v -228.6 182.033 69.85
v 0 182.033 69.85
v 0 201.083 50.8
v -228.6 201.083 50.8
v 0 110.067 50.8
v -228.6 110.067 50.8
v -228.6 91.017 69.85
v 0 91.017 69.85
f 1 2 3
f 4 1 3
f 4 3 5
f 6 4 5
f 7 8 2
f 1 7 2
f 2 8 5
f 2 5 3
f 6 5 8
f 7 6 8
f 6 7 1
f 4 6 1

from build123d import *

# Parameters (mm, degrees)
F0_W     = 273.05
F0_H     = 228.6
F1_DEPTH = 228.6
F3_DEPTH = 228.6
F5_DEPTH = 228.6
F7_DEPTH = 228.6


with BuildPart() as f1:
    # F0 (on Right) → F1 (new body)
    with BuildSketch(Plane.YZ):
        with Locations((136.525, 114.3)):
            Rectangle(F0_W, F0_H)
    extrude(amount=-F1_DEPTH)

    # F2 (on face) → F3 (cut, through all)
    with BuildSketch(Plane.YZ):
        Polygon((182.0333333333, 139.7), (273.05, 139.7), (273.05, 228.6), (0, 228.6), (0, 0), (91.0166666667, 0), (91.0166666667, 69.85), (182.0333333333, 69.85), align=None)
    extrude(amount=-F3_DEPTH, mode=Mode.SUBTRACT)

    # F4 (on face) → F5 (cut, through all)
    with BuildSketch(Plane.YZ):
        Polygon((201.0833333333, 50.8), (110.0666666667, 50.8), (110.0666666667, 0), (273.05, 0), (273.05, 120.65), (201.0833333333, 120.65), align=None)
    extrude(amount=-F5_DEPTH, mode=Mode.SUBTRACT)

    # F6 (on face) → F7 (cut, through all)
    with BuildSketch(Plane.YZ):
        Polygon((273.05, 139.7), (182.0333333333, 139.7), (201.0833333333, 120.65), (273.05, 120.65), align=None)
        Polygon((182.0333333333, 139.7), (182.0333333333, 69.85), (201.0833333333, 50.8), (201.0833333333, 120.65), align=None)
        Polygon((110.0666666667, 50.8), (91.0166666667, 69.85), (91.0166666667, 0), (110.0666666667, 0), align=None)
    extrude(amount=-F7_DEPTH, mode=Mode.SUBTRACT)


solid = f1.part
